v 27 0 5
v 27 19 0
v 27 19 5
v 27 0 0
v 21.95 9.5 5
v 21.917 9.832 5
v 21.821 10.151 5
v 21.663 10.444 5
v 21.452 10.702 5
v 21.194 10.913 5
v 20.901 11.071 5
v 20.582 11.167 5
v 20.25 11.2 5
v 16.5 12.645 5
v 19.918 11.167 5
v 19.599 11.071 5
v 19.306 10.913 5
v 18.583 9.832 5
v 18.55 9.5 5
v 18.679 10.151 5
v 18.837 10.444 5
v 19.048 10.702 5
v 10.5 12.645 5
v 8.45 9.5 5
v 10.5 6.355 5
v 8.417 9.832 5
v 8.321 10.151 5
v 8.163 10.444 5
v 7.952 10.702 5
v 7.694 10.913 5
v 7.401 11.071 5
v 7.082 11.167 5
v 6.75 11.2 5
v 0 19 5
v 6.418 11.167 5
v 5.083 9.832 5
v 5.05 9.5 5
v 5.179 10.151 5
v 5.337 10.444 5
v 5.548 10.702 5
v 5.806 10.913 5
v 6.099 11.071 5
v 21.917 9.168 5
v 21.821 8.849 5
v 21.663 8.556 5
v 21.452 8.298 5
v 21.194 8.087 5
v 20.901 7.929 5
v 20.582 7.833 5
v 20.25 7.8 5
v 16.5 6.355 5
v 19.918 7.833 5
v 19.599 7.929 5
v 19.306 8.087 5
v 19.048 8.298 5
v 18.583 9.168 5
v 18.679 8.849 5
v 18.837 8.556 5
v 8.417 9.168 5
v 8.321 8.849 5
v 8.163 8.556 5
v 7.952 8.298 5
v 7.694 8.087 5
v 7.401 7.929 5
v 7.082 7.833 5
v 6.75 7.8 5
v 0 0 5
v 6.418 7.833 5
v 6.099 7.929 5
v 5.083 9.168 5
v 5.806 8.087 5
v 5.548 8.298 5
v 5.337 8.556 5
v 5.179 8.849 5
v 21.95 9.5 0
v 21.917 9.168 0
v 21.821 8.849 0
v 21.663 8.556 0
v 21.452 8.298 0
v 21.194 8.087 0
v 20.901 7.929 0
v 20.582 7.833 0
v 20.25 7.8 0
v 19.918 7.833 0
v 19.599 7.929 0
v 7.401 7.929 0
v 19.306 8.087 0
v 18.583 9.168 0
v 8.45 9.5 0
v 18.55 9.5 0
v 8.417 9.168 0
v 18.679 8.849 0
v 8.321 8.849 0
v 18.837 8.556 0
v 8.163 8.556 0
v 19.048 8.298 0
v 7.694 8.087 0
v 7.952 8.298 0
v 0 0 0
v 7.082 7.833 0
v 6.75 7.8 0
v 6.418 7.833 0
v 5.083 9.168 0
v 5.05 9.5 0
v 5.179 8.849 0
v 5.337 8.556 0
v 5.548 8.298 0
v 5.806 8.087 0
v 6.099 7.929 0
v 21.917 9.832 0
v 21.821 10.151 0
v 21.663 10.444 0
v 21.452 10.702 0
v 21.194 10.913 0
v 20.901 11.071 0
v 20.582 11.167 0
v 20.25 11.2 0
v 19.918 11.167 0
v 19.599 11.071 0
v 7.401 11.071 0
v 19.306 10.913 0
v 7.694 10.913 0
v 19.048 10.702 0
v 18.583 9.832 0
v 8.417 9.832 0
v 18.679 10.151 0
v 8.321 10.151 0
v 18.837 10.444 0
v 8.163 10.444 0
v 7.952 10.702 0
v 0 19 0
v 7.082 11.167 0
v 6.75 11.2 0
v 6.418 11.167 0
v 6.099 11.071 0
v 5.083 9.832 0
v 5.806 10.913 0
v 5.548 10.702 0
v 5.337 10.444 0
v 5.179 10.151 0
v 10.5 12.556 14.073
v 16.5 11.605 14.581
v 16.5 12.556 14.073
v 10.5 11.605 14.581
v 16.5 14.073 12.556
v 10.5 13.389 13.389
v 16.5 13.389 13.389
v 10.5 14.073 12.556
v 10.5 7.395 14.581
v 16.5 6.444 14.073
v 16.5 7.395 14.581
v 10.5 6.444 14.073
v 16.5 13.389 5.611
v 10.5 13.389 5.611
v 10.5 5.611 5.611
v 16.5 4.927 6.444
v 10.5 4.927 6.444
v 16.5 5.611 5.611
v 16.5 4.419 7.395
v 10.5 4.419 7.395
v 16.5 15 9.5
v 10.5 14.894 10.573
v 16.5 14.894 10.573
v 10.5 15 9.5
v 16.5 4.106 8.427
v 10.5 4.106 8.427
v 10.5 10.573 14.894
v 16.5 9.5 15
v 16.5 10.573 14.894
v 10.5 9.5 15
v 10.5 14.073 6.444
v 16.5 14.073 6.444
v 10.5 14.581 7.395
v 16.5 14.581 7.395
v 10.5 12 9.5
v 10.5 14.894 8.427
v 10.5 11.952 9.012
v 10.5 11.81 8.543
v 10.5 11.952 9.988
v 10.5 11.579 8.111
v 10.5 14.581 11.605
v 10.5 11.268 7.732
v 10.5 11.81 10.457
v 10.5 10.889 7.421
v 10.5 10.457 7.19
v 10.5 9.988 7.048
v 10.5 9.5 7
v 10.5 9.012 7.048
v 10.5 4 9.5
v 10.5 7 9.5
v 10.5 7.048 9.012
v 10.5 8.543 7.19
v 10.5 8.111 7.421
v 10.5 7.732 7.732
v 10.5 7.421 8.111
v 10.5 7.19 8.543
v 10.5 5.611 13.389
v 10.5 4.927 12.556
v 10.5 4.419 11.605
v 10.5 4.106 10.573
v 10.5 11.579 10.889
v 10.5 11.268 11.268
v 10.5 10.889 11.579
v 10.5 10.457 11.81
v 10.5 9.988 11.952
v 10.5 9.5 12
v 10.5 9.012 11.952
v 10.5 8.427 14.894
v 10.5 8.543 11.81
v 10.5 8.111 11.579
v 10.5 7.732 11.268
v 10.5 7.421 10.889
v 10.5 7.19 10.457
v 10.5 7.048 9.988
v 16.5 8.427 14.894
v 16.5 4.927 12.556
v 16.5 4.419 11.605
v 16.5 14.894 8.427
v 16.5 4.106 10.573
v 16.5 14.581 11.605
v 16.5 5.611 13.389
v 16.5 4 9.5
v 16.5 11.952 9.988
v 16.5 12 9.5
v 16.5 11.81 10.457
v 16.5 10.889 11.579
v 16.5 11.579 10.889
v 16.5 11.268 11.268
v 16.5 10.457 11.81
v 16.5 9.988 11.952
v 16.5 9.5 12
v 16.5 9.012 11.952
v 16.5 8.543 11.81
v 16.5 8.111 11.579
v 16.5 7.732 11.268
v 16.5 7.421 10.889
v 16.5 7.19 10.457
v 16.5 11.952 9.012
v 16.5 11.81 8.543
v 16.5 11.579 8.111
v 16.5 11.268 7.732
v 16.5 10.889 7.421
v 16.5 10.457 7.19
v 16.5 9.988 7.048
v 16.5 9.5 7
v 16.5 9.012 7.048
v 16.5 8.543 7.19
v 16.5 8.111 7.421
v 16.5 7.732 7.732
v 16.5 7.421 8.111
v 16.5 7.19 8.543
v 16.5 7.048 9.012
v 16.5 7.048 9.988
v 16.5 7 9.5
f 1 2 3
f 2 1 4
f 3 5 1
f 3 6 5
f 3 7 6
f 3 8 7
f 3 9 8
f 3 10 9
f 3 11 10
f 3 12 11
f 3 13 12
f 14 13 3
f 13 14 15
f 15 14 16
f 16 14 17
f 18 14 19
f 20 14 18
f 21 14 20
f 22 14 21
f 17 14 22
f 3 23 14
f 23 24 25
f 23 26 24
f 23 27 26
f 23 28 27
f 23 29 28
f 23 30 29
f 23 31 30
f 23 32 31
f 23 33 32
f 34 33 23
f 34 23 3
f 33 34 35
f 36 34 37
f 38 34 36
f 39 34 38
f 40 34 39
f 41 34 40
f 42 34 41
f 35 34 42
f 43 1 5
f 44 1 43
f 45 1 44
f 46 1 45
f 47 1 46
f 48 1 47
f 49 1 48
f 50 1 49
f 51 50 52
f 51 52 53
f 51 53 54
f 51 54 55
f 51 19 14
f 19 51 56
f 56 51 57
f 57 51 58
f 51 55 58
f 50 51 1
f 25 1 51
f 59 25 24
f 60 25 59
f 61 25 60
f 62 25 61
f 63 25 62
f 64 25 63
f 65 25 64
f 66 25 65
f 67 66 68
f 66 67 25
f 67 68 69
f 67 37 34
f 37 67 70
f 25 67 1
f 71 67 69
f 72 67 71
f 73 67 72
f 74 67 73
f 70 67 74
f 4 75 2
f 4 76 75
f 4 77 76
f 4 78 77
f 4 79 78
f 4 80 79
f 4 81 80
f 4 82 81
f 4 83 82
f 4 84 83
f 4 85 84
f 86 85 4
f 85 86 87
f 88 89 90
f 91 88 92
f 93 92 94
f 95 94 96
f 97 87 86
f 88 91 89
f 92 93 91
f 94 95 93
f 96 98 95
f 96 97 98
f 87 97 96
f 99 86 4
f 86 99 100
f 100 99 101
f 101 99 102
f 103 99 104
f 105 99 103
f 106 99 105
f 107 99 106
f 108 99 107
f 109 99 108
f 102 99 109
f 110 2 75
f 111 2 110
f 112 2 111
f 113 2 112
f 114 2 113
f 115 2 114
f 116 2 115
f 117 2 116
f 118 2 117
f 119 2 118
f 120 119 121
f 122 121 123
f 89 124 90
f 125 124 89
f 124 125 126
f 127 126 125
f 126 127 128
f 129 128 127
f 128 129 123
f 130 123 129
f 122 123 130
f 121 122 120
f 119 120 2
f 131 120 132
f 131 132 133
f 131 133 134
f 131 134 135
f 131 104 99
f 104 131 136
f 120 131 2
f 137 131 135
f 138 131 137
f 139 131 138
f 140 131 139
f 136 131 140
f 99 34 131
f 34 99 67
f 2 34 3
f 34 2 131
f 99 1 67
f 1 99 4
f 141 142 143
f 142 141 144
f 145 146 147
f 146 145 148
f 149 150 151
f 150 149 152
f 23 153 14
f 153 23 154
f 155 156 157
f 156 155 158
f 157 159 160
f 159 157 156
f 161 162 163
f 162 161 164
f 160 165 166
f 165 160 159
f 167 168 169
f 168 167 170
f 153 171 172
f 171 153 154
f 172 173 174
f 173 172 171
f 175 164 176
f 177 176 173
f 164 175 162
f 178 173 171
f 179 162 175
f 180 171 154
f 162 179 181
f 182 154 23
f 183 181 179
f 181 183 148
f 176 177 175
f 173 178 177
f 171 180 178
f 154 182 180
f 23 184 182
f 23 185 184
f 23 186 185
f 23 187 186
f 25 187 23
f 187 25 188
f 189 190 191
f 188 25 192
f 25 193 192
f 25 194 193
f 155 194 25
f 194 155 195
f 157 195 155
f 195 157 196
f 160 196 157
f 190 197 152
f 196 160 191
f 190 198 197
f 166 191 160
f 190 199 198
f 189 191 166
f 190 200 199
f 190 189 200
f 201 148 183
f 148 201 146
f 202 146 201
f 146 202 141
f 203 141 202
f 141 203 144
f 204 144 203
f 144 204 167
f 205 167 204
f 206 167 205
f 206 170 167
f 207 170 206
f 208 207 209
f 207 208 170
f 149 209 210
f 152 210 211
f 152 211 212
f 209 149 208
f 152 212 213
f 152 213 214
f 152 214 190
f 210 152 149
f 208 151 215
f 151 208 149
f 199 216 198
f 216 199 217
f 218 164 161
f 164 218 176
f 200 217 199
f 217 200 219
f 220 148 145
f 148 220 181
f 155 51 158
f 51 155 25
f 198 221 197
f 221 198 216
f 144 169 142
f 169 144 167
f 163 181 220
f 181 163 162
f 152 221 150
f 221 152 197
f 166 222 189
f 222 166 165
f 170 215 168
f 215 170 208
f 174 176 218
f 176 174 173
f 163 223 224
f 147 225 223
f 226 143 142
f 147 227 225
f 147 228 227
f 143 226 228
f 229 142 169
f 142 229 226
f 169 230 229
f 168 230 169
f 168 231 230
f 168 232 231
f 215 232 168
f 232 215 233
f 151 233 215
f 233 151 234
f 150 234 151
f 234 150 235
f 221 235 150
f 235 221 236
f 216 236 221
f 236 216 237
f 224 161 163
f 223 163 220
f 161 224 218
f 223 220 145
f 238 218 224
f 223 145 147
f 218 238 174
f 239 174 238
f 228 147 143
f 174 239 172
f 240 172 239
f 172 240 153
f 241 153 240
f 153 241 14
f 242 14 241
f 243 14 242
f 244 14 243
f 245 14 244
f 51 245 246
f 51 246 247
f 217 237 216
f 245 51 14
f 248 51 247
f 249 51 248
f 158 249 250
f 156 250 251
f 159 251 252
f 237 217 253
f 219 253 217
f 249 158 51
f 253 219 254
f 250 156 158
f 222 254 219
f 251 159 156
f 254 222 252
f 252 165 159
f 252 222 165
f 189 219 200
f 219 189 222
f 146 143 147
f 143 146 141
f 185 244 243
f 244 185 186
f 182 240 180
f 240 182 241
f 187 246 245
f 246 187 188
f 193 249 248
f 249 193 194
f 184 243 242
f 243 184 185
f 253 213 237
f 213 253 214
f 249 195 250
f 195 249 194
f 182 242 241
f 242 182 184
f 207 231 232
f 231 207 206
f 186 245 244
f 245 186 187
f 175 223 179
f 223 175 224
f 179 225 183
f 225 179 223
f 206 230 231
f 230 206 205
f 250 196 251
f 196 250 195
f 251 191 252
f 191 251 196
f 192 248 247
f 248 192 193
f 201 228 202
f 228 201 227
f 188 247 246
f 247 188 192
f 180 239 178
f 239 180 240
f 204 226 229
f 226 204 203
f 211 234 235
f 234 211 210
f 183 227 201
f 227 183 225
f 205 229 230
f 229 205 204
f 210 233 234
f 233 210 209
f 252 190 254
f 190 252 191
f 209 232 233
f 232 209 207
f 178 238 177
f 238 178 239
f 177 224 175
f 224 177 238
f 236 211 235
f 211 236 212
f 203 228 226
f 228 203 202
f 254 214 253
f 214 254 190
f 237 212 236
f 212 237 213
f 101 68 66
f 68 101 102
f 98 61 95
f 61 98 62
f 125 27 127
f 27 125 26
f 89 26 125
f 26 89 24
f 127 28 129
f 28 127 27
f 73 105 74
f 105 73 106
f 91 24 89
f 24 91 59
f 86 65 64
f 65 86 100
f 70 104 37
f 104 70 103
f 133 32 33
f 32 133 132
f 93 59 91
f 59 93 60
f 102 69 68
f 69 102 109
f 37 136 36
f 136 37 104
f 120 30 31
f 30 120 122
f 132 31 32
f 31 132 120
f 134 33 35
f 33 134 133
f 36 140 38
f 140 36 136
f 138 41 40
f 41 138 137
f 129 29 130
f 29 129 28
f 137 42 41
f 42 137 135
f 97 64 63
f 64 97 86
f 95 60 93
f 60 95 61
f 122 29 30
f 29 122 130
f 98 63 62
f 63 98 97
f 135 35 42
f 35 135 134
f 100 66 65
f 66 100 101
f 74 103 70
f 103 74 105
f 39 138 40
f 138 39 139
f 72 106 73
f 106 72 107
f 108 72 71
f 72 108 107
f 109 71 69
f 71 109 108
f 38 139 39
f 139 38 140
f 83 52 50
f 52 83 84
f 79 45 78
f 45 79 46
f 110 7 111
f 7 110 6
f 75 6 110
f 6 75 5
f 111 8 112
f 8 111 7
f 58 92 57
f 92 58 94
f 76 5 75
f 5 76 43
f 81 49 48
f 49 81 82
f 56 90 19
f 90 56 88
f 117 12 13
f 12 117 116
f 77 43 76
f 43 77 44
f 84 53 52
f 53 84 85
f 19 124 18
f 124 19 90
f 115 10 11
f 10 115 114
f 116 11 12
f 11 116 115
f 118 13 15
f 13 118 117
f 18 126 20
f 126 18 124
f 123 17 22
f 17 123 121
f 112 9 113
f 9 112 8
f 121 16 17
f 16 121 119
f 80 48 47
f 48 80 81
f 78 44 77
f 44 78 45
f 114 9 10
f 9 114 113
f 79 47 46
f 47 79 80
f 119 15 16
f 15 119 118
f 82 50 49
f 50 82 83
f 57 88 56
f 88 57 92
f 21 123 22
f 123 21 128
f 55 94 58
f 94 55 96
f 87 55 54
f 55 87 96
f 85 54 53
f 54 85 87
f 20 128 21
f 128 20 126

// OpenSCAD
$fn = 32;

// ----------------------------------------------------------------------
// Cable clip: cable 5 mm, clamp 11 mm, base 27 mm
// ----------------------------------------------------------------------

// --- parameters (mm) ---
plate_x = 27;             // base length, X
plate_y = 19;             // base width, Y
plate_t = 5;              // base thickness
wire_seat_d = 11;         // clamp outside diameter
clip_t = 3;               // clamp wall
cable_d = 5;              // cable opening
ring_w = 6;               // clamp width along the cable
screw_d = 3.4;            // screw clearance
sink = 1;                 // overlap of the clamp into the base

module base() {
  cube([plate_x, plate_y, plate_t]);
}

module clamp() {
  translate([plate_x / 2, plate_y / 2, plate_t + wire_seat_d / 2 - sink]) rotate([0, 90, 0])
    cylinder(h = ring_w, d = wire_seat_d, center = true);
}

difference() {
  union() {
    base();
    clamp();
  }
  translate([plate_x / 2, plate_y / 2, plate_t + wire_seat_d / 2 - sink]) rotate([0, 90, 0]) translate([0, 0, -ring_w / 2 - 1]) cylinder(h = ring_w + 2, d = cable_d);
  translate([6.75, plate_y / 2, -1]) cylinder(h = plate_t + 2, d = screw_d);
  translate([20.25, plate_y / 2, -1]) cylinder(h = plate_t + 2, d = screw_d);
}
